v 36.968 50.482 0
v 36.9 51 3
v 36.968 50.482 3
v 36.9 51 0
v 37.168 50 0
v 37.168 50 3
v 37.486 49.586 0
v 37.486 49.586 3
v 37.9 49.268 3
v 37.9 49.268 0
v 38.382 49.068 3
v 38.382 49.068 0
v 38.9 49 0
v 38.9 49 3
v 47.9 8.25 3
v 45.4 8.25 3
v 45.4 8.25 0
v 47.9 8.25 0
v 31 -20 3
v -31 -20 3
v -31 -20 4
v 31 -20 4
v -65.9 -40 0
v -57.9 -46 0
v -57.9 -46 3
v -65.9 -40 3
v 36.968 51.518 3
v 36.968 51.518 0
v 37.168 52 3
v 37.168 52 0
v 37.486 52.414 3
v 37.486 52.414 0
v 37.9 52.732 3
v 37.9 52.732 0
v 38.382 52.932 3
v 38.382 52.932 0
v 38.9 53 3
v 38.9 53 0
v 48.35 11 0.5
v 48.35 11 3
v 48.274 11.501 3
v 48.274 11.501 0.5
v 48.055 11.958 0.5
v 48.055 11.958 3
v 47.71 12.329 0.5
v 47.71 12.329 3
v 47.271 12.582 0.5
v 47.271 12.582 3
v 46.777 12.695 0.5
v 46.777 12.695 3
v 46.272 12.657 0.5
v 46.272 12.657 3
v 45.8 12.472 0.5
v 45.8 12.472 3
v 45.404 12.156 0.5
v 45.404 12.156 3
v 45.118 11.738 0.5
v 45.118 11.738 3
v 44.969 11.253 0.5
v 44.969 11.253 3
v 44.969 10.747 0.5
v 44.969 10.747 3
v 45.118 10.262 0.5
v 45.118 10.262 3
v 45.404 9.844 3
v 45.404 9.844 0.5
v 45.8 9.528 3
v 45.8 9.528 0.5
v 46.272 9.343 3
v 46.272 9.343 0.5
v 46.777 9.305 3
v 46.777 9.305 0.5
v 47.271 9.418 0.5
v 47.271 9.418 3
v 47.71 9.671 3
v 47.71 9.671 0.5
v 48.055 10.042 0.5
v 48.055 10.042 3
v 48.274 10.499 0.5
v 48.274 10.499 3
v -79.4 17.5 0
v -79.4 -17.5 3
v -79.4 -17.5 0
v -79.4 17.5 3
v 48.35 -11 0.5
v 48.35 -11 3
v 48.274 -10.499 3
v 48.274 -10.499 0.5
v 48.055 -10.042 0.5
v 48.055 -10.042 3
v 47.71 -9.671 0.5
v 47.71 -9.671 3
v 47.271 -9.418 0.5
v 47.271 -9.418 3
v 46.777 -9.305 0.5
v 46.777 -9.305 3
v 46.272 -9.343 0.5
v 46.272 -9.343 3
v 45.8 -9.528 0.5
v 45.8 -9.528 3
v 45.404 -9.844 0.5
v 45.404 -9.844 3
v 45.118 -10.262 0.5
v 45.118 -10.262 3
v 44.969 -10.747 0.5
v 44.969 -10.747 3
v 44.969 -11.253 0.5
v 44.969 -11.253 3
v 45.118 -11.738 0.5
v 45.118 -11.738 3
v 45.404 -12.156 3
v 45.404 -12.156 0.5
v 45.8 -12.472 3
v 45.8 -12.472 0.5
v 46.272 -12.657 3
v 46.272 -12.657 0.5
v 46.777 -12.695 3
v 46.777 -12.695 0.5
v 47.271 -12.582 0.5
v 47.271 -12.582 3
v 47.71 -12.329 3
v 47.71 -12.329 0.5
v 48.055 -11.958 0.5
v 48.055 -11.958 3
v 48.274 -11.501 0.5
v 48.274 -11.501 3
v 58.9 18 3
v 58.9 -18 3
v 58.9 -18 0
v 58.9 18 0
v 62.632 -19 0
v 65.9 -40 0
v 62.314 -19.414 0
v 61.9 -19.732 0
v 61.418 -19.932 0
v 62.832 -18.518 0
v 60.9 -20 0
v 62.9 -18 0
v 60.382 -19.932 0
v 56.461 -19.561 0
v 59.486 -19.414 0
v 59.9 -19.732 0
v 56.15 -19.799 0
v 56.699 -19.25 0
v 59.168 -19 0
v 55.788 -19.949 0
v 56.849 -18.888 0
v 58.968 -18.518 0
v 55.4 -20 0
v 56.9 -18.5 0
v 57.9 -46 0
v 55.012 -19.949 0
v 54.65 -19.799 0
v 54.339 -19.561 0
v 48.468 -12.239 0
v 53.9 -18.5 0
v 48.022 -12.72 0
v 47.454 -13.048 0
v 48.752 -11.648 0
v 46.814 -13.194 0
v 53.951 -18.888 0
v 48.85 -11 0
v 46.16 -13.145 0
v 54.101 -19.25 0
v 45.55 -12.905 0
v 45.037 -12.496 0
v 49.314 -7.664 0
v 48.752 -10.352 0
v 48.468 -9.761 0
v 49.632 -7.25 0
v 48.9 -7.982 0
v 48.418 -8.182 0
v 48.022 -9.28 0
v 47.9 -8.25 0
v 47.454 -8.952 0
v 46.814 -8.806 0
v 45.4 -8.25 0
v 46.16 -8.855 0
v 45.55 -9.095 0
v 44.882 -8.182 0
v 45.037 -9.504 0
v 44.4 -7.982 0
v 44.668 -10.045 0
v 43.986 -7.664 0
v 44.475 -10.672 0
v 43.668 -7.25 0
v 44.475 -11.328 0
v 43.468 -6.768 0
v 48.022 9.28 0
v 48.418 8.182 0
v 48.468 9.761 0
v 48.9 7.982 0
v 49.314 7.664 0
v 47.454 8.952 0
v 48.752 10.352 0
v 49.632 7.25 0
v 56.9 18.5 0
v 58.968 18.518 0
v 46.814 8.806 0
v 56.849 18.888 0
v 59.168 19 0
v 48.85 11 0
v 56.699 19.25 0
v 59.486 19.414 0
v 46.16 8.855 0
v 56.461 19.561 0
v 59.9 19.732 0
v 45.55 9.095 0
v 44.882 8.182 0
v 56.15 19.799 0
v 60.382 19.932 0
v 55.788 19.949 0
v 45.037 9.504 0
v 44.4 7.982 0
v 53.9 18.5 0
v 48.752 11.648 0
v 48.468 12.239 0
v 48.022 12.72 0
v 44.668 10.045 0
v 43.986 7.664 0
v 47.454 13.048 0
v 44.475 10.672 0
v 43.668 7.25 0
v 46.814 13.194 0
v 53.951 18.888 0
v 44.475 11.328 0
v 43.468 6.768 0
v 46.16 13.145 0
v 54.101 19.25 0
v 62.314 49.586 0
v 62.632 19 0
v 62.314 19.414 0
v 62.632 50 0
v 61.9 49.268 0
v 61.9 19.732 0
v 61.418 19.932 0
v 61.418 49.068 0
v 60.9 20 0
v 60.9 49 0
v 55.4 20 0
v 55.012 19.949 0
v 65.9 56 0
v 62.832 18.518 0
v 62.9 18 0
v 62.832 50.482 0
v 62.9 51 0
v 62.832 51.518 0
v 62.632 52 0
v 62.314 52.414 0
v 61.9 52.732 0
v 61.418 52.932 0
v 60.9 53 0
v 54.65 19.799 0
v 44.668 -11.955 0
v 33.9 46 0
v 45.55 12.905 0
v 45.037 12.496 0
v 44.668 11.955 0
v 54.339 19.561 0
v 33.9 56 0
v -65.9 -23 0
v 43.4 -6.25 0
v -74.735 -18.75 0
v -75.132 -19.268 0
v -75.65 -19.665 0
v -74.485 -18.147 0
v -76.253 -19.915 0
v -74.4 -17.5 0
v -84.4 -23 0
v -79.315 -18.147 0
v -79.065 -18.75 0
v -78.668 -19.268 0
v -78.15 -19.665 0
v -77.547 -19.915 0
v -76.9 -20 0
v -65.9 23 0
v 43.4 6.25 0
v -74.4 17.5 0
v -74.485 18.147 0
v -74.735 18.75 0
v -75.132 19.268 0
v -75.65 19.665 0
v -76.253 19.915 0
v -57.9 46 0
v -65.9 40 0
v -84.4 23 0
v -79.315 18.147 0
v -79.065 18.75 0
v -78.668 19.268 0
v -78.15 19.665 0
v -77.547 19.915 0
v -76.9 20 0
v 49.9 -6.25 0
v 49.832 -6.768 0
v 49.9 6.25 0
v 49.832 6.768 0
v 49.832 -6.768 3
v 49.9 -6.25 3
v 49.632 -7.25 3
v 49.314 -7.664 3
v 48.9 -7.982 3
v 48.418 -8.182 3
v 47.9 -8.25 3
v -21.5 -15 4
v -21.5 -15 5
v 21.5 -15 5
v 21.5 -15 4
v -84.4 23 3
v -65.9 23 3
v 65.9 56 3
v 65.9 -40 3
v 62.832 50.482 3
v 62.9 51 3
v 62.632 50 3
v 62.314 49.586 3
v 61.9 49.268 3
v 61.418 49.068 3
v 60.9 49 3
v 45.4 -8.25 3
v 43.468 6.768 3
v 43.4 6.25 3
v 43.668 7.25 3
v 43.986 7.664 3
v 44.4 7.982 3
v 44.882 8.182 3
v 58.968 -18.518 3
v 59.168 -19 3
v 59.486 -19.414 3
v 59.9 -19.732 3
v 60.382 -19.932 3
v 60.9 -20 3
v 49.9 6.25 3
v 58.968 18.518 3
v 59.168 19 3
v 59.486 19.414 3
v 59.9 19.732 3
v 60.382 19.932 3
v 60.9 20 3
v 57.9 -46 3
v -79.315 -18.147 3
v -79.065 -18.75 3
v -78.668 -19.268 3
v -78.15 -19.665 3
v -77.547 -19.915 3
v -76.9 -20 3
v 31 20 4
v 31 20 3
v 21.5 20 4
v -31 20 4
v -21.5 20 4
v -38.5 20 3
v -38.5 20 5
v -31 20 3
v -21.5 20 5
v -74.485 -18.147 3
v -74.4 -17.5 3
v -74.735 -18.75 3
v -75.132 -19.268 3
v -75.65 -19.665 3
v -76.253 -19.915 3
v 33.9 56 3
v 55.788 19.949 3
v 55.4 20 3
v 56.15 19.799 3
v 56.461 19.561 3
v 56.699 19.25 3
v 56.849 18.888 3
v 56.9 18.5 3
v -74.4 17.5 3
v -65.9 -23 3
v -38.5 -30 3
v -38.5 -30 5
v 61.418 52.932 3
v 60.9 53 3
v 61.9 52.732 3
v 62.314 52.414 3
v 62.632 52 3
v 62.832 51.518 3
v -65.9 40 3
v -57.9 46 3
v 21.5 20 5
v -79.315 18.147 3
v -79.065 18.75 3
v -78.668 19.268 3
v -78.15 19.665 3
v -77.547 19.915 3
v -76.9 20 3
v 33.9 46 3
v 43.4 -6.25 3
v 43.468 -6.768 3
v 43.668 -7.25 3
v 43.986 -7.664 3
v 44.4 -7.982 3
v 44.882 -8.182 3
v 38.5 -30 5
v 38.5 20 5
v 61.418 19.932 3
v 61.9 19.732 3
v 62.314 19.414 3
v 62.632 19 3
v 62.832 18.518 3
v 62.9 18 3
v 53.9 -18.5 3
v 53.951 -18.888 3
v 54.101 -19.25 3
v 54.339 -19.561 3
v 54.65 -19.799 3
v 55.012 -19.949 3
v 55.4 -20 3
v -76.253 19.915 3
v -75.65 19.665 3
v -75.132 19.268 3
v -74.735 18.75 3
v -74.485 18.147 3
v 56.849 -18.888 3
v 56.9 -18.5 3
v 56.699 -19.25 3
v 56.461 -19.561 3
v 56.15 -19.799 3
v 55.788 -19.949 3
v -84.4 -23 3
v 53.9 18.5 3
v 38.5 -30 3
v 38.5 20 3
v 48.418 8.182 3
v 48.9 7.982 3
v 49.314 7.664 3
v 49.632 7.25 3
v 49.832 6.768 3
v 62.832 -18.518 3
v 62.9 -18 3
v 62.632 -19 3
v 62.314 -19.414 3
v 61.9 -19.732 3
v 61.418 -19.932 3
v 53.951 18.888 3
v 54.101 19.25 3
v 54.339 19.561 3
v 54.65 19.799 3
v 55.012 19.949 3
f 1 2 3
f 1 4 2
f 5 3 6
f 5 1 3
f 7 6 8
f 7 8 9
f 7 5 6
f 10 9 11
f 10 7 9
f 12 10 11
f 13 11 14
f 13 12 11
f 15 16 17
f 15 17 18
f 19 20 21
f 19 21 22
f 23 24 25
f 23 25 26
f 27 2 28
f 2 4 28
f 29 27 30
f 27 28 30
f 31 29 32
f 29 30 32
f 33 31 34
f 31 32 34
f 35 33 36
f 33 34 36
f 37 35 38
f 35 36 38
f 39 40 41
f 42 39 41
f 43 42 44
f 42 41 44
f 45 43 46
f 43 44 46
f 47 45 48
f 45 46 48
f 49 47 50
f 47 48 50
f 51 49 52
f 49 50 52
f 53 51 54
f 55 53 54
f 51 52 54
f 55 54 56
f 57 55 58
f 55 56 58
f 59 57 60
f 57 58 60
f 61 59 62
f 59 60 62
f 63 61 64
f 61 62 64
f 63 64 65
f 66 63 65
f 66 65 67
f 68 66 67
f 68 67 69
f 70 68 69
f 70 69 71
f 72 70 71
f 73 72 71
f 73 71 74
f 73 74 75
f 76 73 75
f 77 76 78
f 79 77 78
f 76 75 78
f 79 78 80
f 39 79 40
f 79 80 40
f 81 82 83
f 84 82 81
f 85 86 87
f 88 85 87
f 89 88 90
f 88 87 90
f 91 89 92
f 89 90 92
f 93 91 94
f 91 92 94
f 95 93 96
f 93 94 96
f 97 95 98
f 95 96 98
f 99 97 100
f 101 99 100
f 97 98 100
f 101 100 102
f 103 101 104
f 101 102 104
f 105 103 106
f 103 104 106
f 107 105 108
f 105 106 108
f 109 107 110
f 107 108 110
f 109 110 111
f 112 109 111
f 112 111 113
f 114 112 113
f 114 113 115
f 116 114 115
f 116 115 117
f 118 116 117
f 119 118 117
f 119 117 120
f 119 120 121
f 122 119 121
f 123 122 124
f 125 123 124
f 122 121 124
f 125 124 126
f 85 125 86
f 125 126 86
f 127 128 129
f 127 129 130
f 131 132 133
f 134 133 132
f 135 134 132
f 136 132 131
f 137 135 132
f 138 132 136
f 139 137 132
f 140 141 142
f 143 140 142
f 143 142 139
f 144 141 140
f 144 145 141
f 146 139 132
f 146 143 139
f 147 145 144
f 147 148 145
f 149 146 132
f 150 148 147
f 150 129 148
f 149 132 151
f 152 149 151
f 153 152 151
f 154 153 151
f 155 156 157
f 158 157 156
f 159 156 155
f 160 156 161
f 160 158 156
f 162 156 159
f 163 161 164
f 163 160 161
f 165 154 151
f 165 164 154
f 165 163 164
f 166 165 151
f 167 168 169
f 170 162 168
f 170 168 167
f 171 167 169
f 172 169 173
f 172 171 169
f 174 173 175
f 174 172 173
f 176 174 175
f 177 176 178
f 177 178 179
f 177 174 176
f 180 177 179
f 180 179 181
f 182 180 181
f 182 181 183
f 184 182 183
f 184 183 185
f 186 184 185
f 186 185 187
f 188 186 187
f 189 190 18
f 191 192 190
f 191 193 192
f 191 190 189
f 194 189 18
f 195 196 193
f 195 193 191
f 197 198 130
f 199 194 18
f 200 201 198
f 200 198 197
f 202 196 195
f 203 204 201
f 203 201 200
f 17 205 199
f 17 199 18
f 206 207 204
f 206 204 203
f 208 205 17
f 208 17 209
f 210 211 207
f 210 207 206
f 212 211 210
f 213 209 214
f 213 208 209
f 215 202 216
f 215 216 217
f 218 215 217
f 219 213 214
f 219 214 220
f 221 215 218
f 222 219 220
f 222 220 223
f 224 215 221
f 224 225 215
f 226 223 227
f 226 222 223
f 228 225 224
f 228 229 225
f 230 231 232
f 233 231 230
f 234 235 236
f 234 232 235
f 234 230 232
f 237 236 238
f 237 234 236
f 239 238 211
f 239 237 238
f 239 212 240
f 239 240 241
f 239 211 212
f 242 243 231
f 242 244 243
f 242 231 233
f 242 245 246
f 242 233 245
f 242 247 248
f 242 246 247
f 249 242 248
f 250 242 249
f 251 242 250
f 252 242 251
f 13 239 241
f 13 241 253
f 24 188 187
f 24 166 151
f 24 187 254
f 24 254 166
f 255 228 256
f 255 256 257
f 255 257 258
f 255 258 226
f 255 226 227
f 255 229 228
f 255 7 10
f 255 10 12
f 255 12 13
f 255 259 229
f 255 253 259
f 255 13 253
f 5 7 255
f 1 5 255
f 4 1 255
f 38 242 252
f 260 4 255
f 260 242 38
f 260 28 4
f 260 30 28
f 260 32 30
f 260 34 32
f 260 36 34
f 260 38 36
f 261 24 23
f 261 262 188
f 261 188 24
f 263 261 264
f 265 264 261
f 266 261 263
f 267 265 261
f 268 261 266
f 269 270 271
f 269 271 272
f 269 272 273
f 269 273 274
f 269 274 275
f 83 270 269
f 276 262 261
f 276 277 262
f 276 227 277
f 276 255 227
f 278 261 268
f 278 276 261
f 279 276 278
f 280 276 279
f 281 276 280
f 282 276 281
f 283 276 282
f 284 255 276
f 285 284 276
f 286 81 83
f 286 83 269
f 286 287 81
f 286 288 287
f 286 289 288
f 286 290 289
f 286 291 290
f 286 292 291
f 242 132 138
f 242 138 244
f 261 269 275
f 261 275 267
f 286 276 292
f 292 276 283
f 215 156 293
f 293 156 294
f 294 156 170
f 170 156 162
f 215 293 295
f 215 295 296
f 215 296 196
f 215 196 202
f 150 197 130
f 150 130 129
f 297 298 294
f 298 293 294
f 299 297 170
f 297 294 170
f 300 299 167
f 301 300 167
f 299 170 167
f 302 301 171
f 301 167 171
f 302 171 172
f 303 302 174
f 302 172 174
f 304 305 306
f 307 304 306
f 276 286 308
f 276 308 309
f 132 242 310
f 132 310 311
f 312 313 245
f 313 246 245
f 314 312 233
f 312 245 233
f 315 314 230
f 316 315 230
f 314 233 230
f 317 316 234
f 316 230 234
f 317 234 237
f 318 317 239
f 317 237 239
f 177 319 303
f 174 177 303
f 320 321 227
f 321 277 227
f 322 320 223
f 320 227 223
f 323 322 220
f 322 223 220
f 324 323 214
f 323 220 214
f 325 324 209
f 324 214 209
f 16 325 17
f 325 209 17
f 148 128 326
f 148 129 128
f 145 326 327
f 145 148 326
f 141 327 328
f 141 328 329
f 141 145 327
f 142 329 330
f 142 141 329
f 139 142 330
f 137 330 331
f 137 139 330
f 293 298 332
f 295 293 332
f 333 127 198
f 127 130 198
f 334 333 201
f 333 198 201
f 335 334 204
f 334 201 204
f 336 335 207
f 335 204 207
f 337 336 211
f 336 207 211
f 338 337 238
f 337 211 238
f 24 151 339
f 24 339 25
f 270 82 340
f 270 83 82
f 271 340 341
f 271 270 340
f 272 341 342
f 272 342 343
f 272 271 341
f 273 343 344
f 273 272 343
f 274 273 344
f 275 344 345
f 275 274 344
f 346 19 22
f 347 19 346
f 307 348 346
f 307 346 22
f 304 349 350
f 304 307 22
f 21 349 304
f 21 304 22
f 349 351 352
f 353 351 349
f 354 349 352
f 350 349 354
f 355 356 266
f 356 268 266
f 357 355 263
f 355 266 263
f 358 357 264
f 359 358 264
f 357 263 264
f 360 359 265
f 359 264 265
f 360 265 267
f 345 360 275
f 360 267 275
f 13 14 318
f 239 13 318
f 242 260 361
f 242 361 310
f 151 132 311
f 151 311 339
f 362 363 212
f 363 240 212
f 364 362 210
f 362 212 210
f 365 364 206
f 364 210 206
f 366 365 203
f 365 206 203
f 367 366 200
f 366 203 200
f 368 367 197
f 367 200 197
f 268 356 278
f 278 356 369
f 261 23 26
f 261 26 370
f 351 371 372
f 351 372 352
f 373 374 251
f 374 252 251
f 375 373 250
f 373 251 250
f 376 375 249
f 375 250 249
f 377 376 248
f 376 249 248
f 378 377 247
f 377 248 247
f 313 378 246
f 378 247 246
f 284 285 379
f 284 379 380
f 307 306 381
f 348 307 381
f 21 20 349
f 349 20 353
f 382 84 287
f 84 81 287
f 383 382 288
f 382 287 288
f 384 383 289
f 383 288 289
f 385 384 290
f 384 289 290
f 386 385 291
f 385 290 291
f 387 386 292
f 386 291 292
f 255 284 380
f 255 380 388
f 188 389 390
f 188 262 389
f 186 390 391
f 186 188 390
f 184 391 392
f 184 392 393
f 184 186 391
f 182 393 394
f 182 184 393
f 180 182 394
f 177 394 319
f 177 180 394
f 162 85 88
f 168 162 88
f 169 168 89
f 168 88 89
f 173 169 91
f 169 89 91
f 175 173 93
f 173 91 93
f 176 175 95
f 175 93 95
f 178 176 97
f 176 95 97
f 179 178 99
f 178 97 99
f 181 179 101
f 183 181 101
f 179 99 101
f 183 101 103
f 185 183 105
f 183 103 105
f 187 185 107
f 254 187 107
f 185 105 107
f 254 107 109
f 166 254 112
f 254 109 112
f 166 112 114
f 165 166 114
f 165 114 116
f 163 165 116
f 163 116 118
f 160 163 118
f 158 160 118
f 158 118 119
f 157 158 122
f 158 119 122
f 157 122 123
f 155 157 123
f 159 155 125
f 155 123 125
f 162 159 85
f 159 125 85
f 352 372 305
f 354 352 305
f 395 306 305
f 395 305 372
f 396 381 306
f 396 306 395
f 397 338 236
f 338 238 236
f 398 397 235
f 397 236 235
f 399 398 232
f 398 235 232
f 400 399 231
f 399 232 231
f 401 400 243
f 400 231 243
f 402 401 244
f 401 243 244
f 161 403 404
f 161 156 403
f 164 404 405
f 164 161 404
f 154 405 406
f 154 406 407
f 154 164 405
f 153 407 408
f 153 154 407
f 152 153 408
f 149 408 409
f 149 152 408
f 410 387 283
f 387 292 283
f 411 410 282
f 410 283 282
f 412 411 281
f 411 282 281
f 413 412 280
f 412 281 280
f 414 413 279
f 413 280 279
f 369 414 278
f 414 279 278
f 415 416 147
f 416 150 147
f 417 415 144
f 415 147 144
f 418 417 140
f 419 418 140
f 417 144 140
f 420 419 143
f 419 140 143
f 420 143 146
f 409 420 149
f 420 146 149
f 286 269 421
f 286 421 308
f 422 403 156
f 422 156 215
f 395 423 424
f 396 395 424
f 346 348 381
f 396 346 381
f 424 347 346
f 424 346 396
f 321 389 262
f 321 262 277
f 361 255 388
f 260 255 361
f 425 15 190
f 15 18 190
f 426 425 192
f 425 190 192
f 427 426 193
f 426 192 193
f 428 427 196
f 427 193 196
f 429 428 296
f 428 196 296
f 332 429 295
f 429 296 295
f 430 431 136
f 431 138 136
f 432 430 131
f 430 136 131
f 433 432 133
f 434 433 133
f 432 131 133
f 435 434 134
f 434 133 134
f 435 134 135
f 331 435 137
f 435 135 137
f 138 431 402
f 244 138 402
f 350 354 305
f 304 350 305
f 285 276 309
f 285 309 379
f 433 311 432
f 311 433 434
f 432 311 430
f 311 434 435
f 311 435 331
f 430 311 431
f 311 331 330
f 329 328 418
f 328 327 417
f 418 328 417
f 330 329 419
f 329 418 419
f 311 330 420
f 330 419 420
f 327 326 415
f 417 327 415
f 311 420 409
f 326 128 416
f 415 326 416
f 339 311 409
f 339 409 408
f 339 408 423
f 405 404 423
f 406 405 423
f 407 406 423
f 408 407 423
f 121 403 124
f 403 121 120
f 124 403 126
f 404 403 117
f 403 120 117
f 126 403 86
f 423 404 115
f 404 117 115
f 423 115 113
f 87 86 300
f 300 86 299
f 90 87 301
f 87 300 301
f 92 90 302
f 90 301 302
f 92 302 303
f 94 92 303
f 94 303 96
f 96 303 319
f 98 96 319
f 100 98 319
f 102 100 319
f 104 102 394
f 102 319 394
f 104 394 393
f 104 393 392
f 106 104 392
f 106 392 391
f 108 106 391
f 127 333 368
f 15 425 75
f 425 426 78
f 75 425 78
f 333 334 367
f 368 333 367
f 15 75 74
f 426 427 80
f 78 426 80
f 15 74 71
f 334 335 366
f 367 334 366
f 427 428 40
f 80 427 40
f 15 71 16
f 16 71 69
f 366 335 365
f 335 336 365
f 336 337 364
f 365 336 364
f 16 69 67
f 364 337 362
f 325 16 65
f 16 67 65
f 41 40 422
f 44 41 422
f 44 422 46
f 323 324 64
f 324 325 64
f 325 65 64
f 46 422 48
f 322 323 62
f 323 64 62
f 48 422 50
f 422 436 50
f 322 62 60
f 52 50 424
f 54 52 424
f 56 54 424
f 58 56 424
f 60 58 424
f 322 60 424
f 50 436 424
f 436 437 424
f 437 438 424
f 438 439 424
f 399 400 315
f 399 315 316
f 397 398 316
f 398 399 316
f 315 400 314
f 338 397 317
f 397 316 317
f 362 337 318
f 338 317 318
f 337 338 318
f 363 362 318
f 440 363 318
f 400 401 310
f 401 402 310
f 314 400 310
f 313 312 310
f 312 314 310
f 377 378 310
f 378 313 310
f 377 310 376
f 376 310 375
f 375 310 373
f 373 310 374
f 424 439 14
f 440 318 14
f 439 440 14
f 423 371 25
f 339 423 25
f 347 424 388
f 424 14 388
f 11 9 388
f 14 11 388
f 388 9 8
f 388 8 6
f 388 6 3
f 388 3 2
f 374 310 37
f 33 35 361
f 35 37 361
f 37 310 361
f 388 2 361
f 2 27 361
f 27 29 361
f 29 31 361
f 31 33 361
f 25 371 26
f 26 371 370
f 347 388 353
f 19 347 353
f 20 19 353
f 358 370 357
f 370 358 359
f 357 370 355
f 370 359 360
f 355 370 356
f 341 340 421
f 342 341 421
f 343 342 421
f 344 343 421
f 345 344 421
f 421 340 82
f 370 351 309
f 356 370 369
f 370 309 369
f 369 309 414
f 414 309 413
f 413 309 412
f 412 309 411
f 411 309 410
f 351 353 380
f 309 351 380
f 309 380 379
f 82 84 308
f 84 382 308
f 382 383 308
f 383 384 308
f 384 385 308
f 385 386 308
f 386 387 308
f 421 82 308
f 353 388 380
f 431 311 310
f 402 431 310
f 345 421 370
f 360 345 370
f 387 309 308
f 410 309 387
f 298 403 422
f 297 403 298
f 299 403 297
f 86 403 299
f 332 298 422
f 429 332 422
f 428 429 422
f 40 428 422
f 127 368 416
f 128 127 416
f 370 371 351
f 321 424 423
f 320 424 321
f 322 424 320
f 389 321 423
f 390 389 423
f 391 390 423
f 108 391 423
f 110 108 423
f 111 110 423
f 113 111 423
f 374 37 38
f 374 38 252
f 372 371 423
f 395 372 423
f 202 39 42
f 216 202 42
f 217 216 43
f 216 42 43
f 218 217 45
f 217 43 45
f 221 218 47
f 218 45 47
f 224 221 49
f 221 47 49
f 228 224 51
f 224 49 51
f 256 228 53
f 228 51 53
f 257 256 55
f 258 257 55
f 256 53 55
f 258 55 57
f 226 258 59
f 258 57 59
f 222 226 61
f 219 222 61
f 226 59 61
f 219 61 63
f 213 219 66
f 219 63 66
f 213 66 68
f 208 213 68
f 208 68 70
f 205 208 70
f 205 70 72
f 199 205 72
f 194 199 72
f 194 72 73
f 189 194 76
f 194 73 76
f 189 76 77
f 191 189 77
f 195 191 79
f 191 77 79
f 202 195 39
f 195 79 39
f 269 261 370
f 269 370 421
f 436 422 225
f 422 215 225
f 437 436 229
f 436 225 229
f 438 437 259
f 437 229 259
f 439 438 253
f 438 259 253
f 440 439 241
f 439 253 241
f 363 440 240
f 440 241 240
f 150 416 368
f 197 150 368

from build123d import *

# Parameters (mm, degrees)
SKETCH029_W     = 62
SKETCH029_H     = 40
PAD002_DEPTH    = 2
SKETCH030_W     = 40
SKETCH030_H     = 1
POCKET001_DEPTH = 9.5
SKETCH031_W     = 40
SKETCH031_H     = 1
POCKET002_DEPTH = 9.5
SKETCH032_W     = 43
SKETCH032_H     = 1
POCKET003_DEPTH = 5
PAD_DEPTH       = 3
SKETCH027_R     = 1.7
SKETCH027_W     = 6.5
SKETCH027_H     = 16.5
SKETCH027_W_2   = 4
SKETCH027_H_2   = 40
SKETCH027_W_3   = 3
SKETCH027_W_4   = 26
SKETCH027_H_3   = 4
SKETCH027_W_5   = 5
POCKET_DEPTH    = 3
FILLET001_R     = 1.9999
FILLET002_R     = 1.4999
FILLET003_R     = 2.4999
CHAMFER001_SIZE = 0.5
SKETCH028_W     = 77
SKETCH028_H     = 50
PAD001_DEPTH    = 2


with BuildPart() as body002:
    # Sketch029 → Pad002 (new body)
    with BuildSketch(Plane.XY):
        Rectangle(SKETCH029_W, SKETCH029_H)
    extrude(amount=PAD002_DEPTH)

    # Sketch030 (on Face2 of Pad002) → Pocket001 (cut)
    with BuildSketch(Plane.YZ.offset(31)):
        with Locations((0, 1.5)):
            Rectangle(SKETCH030_W, SKETCH030_H)
    extrude(amount=-POCKET001_DEPTH, mode=Mode.SUBTRACT)

    # Sketch031 (on Face7 of Pocket001) → Pocket002 (cut)
    with BuildSketch(Plane(origin=(-31, 0, 0), x_dir=(0, -1, 0), z_dir=(-1, 0, 0))):
        with Locations((0, 1.5)):
            Rectangle(SKETCH031_W, SKETCH031_H)
    extrude(amount=-POCKET002_DEPTH, mode=Mode.SUBTRACT)

    # Sketch032 (on Face10 of Pocket002) → Pocket003 (cut)
    with BuildSketch(Plane.XZ.offset(20)):
        with Locations((0, 1.5)):
            Rectangle(SKETCH032_W, SKETCH032_H)
    extrude(amount=-POCKET003_DEPTH, mode=Mode.SUBTRACT)


with BuildPart() as body002_1:
    # Body002 placement: moved
    add(body002.part.moved(Location((0, 0, 3))))


with BuildPart() as chest_mount:
    # Sketch → Pad (new body)
    with BuildSketch(Plane.XY):
        Polygon((-57.9, 46), (33.9, 46), (33.9, 56), (65.9, 56), (65.9, -40), (57.9, -46), (-57.9, -46), (-65.9, -40), (-65.9, -23), (-84.4, -23), (-84.4, 23), (-65.9, 23), (-65.9, 40), align=None)
    extrude(amount=PAD_DEPTH)

    # Sketch027 (on Face15 of Pad) → Pocket (cut)
    with BuildSketch(Plane.XY.offset(3)):
        with Locations((46.65, 11)):
            Circle(SKETCH027_R)
        with Locations((46.65, -11)):
            Circle(SKETCH027_R)
        with Locations((46.65, 0)):
            Rectangle(SKETCH027_W, SKETCH027_H)
        with Locations((60.9, 0)):
            Rectangle(SKETCH027_W_2, SKETCH027_H_2)
        with Locations((55.4, 0)):
            Rectangle(SKETCH027_W_3, SKETCH027_H_2)
        with Locations((49.9, 51)):
            Rectangle(SKETCH027_W_4, SKETCH027_H_3)
        with Locations((-76.9, 0)):
            Rectangle(SKETCH027_W_5, SKETCH027_H_2)
    extrude(amount=-POCKET_DEPTH, mode=Mode.SUBTRACT)

    # Fillet001
    fillet001_edges = [chest_mount.edges().sort_by_distance(p)[0] for p in [
        (62.9, 20, 1.5),
        (58.9, 20, 1.5),
        (62.9, -20, 1.5),
        (58.9, -20, 1.5),
        (36.9, 49, 1.5),
        (62.9, 49, 1.5),
        (62.9, 53, 1.5),
        (36.9, 53, 1.5),
        (49.9, -8.25, 1.5),
        (43.4, -8.25, 1.5),
        (43.4, 8.25, 1.5),
        (49.9, 8.25, 1.5),
    ]]
    fillet(fillet001_edges, radius=FILLET001_R)

    # Fillet002
    fillet002_edges = [chest_mount.edges().sort_by_distance(p)[0] for p in [
        (53.9, -20, 1.5),
        (56.9, -20, 1.5),
        (53.9, 20, 1.5),
        (56.9, 20, 1.5),
    ]]
    fillet(fillet002_edges, radius=FILLET002_R)

    # Fillet003
    fillet003_edges = [chest_mount.edges().sort_by_distance(p)[0] for p in [
        (-74.4, -20, 1.5),
        (-79.4, -20, 1.5),
        (-79.4, 20, 1.5),
        (-74.4, 20, 1.5),
    ]]
    fillet(fillet003_edges, radius=FILLET003_R)

    # Chamfer001
    chamfer001_edges = [chest_mount.edges().sort_by_distance(p)[0] for p in [
        (44.95, 11, 0),
        (44.95, -11, 0),
    ]]
    chamfer(chamfer001_edges, length=CHAMFER001_SIZE)

    # Sketch028 (on Face58 of Chamfer001) → Pad001 (join)
    with BuildSketch(Plane.XY.offset(3)):
        with Locations((0, -5)):
            Rectangle(SKETCH028_W, SKETCH028_H)
    extrude(amount=PAD001_DEPTH)

    # Boolean: cut Body002
    add(body002_1.part, mode=Mode.SUBTRACT)


solid = chest_mount.part
